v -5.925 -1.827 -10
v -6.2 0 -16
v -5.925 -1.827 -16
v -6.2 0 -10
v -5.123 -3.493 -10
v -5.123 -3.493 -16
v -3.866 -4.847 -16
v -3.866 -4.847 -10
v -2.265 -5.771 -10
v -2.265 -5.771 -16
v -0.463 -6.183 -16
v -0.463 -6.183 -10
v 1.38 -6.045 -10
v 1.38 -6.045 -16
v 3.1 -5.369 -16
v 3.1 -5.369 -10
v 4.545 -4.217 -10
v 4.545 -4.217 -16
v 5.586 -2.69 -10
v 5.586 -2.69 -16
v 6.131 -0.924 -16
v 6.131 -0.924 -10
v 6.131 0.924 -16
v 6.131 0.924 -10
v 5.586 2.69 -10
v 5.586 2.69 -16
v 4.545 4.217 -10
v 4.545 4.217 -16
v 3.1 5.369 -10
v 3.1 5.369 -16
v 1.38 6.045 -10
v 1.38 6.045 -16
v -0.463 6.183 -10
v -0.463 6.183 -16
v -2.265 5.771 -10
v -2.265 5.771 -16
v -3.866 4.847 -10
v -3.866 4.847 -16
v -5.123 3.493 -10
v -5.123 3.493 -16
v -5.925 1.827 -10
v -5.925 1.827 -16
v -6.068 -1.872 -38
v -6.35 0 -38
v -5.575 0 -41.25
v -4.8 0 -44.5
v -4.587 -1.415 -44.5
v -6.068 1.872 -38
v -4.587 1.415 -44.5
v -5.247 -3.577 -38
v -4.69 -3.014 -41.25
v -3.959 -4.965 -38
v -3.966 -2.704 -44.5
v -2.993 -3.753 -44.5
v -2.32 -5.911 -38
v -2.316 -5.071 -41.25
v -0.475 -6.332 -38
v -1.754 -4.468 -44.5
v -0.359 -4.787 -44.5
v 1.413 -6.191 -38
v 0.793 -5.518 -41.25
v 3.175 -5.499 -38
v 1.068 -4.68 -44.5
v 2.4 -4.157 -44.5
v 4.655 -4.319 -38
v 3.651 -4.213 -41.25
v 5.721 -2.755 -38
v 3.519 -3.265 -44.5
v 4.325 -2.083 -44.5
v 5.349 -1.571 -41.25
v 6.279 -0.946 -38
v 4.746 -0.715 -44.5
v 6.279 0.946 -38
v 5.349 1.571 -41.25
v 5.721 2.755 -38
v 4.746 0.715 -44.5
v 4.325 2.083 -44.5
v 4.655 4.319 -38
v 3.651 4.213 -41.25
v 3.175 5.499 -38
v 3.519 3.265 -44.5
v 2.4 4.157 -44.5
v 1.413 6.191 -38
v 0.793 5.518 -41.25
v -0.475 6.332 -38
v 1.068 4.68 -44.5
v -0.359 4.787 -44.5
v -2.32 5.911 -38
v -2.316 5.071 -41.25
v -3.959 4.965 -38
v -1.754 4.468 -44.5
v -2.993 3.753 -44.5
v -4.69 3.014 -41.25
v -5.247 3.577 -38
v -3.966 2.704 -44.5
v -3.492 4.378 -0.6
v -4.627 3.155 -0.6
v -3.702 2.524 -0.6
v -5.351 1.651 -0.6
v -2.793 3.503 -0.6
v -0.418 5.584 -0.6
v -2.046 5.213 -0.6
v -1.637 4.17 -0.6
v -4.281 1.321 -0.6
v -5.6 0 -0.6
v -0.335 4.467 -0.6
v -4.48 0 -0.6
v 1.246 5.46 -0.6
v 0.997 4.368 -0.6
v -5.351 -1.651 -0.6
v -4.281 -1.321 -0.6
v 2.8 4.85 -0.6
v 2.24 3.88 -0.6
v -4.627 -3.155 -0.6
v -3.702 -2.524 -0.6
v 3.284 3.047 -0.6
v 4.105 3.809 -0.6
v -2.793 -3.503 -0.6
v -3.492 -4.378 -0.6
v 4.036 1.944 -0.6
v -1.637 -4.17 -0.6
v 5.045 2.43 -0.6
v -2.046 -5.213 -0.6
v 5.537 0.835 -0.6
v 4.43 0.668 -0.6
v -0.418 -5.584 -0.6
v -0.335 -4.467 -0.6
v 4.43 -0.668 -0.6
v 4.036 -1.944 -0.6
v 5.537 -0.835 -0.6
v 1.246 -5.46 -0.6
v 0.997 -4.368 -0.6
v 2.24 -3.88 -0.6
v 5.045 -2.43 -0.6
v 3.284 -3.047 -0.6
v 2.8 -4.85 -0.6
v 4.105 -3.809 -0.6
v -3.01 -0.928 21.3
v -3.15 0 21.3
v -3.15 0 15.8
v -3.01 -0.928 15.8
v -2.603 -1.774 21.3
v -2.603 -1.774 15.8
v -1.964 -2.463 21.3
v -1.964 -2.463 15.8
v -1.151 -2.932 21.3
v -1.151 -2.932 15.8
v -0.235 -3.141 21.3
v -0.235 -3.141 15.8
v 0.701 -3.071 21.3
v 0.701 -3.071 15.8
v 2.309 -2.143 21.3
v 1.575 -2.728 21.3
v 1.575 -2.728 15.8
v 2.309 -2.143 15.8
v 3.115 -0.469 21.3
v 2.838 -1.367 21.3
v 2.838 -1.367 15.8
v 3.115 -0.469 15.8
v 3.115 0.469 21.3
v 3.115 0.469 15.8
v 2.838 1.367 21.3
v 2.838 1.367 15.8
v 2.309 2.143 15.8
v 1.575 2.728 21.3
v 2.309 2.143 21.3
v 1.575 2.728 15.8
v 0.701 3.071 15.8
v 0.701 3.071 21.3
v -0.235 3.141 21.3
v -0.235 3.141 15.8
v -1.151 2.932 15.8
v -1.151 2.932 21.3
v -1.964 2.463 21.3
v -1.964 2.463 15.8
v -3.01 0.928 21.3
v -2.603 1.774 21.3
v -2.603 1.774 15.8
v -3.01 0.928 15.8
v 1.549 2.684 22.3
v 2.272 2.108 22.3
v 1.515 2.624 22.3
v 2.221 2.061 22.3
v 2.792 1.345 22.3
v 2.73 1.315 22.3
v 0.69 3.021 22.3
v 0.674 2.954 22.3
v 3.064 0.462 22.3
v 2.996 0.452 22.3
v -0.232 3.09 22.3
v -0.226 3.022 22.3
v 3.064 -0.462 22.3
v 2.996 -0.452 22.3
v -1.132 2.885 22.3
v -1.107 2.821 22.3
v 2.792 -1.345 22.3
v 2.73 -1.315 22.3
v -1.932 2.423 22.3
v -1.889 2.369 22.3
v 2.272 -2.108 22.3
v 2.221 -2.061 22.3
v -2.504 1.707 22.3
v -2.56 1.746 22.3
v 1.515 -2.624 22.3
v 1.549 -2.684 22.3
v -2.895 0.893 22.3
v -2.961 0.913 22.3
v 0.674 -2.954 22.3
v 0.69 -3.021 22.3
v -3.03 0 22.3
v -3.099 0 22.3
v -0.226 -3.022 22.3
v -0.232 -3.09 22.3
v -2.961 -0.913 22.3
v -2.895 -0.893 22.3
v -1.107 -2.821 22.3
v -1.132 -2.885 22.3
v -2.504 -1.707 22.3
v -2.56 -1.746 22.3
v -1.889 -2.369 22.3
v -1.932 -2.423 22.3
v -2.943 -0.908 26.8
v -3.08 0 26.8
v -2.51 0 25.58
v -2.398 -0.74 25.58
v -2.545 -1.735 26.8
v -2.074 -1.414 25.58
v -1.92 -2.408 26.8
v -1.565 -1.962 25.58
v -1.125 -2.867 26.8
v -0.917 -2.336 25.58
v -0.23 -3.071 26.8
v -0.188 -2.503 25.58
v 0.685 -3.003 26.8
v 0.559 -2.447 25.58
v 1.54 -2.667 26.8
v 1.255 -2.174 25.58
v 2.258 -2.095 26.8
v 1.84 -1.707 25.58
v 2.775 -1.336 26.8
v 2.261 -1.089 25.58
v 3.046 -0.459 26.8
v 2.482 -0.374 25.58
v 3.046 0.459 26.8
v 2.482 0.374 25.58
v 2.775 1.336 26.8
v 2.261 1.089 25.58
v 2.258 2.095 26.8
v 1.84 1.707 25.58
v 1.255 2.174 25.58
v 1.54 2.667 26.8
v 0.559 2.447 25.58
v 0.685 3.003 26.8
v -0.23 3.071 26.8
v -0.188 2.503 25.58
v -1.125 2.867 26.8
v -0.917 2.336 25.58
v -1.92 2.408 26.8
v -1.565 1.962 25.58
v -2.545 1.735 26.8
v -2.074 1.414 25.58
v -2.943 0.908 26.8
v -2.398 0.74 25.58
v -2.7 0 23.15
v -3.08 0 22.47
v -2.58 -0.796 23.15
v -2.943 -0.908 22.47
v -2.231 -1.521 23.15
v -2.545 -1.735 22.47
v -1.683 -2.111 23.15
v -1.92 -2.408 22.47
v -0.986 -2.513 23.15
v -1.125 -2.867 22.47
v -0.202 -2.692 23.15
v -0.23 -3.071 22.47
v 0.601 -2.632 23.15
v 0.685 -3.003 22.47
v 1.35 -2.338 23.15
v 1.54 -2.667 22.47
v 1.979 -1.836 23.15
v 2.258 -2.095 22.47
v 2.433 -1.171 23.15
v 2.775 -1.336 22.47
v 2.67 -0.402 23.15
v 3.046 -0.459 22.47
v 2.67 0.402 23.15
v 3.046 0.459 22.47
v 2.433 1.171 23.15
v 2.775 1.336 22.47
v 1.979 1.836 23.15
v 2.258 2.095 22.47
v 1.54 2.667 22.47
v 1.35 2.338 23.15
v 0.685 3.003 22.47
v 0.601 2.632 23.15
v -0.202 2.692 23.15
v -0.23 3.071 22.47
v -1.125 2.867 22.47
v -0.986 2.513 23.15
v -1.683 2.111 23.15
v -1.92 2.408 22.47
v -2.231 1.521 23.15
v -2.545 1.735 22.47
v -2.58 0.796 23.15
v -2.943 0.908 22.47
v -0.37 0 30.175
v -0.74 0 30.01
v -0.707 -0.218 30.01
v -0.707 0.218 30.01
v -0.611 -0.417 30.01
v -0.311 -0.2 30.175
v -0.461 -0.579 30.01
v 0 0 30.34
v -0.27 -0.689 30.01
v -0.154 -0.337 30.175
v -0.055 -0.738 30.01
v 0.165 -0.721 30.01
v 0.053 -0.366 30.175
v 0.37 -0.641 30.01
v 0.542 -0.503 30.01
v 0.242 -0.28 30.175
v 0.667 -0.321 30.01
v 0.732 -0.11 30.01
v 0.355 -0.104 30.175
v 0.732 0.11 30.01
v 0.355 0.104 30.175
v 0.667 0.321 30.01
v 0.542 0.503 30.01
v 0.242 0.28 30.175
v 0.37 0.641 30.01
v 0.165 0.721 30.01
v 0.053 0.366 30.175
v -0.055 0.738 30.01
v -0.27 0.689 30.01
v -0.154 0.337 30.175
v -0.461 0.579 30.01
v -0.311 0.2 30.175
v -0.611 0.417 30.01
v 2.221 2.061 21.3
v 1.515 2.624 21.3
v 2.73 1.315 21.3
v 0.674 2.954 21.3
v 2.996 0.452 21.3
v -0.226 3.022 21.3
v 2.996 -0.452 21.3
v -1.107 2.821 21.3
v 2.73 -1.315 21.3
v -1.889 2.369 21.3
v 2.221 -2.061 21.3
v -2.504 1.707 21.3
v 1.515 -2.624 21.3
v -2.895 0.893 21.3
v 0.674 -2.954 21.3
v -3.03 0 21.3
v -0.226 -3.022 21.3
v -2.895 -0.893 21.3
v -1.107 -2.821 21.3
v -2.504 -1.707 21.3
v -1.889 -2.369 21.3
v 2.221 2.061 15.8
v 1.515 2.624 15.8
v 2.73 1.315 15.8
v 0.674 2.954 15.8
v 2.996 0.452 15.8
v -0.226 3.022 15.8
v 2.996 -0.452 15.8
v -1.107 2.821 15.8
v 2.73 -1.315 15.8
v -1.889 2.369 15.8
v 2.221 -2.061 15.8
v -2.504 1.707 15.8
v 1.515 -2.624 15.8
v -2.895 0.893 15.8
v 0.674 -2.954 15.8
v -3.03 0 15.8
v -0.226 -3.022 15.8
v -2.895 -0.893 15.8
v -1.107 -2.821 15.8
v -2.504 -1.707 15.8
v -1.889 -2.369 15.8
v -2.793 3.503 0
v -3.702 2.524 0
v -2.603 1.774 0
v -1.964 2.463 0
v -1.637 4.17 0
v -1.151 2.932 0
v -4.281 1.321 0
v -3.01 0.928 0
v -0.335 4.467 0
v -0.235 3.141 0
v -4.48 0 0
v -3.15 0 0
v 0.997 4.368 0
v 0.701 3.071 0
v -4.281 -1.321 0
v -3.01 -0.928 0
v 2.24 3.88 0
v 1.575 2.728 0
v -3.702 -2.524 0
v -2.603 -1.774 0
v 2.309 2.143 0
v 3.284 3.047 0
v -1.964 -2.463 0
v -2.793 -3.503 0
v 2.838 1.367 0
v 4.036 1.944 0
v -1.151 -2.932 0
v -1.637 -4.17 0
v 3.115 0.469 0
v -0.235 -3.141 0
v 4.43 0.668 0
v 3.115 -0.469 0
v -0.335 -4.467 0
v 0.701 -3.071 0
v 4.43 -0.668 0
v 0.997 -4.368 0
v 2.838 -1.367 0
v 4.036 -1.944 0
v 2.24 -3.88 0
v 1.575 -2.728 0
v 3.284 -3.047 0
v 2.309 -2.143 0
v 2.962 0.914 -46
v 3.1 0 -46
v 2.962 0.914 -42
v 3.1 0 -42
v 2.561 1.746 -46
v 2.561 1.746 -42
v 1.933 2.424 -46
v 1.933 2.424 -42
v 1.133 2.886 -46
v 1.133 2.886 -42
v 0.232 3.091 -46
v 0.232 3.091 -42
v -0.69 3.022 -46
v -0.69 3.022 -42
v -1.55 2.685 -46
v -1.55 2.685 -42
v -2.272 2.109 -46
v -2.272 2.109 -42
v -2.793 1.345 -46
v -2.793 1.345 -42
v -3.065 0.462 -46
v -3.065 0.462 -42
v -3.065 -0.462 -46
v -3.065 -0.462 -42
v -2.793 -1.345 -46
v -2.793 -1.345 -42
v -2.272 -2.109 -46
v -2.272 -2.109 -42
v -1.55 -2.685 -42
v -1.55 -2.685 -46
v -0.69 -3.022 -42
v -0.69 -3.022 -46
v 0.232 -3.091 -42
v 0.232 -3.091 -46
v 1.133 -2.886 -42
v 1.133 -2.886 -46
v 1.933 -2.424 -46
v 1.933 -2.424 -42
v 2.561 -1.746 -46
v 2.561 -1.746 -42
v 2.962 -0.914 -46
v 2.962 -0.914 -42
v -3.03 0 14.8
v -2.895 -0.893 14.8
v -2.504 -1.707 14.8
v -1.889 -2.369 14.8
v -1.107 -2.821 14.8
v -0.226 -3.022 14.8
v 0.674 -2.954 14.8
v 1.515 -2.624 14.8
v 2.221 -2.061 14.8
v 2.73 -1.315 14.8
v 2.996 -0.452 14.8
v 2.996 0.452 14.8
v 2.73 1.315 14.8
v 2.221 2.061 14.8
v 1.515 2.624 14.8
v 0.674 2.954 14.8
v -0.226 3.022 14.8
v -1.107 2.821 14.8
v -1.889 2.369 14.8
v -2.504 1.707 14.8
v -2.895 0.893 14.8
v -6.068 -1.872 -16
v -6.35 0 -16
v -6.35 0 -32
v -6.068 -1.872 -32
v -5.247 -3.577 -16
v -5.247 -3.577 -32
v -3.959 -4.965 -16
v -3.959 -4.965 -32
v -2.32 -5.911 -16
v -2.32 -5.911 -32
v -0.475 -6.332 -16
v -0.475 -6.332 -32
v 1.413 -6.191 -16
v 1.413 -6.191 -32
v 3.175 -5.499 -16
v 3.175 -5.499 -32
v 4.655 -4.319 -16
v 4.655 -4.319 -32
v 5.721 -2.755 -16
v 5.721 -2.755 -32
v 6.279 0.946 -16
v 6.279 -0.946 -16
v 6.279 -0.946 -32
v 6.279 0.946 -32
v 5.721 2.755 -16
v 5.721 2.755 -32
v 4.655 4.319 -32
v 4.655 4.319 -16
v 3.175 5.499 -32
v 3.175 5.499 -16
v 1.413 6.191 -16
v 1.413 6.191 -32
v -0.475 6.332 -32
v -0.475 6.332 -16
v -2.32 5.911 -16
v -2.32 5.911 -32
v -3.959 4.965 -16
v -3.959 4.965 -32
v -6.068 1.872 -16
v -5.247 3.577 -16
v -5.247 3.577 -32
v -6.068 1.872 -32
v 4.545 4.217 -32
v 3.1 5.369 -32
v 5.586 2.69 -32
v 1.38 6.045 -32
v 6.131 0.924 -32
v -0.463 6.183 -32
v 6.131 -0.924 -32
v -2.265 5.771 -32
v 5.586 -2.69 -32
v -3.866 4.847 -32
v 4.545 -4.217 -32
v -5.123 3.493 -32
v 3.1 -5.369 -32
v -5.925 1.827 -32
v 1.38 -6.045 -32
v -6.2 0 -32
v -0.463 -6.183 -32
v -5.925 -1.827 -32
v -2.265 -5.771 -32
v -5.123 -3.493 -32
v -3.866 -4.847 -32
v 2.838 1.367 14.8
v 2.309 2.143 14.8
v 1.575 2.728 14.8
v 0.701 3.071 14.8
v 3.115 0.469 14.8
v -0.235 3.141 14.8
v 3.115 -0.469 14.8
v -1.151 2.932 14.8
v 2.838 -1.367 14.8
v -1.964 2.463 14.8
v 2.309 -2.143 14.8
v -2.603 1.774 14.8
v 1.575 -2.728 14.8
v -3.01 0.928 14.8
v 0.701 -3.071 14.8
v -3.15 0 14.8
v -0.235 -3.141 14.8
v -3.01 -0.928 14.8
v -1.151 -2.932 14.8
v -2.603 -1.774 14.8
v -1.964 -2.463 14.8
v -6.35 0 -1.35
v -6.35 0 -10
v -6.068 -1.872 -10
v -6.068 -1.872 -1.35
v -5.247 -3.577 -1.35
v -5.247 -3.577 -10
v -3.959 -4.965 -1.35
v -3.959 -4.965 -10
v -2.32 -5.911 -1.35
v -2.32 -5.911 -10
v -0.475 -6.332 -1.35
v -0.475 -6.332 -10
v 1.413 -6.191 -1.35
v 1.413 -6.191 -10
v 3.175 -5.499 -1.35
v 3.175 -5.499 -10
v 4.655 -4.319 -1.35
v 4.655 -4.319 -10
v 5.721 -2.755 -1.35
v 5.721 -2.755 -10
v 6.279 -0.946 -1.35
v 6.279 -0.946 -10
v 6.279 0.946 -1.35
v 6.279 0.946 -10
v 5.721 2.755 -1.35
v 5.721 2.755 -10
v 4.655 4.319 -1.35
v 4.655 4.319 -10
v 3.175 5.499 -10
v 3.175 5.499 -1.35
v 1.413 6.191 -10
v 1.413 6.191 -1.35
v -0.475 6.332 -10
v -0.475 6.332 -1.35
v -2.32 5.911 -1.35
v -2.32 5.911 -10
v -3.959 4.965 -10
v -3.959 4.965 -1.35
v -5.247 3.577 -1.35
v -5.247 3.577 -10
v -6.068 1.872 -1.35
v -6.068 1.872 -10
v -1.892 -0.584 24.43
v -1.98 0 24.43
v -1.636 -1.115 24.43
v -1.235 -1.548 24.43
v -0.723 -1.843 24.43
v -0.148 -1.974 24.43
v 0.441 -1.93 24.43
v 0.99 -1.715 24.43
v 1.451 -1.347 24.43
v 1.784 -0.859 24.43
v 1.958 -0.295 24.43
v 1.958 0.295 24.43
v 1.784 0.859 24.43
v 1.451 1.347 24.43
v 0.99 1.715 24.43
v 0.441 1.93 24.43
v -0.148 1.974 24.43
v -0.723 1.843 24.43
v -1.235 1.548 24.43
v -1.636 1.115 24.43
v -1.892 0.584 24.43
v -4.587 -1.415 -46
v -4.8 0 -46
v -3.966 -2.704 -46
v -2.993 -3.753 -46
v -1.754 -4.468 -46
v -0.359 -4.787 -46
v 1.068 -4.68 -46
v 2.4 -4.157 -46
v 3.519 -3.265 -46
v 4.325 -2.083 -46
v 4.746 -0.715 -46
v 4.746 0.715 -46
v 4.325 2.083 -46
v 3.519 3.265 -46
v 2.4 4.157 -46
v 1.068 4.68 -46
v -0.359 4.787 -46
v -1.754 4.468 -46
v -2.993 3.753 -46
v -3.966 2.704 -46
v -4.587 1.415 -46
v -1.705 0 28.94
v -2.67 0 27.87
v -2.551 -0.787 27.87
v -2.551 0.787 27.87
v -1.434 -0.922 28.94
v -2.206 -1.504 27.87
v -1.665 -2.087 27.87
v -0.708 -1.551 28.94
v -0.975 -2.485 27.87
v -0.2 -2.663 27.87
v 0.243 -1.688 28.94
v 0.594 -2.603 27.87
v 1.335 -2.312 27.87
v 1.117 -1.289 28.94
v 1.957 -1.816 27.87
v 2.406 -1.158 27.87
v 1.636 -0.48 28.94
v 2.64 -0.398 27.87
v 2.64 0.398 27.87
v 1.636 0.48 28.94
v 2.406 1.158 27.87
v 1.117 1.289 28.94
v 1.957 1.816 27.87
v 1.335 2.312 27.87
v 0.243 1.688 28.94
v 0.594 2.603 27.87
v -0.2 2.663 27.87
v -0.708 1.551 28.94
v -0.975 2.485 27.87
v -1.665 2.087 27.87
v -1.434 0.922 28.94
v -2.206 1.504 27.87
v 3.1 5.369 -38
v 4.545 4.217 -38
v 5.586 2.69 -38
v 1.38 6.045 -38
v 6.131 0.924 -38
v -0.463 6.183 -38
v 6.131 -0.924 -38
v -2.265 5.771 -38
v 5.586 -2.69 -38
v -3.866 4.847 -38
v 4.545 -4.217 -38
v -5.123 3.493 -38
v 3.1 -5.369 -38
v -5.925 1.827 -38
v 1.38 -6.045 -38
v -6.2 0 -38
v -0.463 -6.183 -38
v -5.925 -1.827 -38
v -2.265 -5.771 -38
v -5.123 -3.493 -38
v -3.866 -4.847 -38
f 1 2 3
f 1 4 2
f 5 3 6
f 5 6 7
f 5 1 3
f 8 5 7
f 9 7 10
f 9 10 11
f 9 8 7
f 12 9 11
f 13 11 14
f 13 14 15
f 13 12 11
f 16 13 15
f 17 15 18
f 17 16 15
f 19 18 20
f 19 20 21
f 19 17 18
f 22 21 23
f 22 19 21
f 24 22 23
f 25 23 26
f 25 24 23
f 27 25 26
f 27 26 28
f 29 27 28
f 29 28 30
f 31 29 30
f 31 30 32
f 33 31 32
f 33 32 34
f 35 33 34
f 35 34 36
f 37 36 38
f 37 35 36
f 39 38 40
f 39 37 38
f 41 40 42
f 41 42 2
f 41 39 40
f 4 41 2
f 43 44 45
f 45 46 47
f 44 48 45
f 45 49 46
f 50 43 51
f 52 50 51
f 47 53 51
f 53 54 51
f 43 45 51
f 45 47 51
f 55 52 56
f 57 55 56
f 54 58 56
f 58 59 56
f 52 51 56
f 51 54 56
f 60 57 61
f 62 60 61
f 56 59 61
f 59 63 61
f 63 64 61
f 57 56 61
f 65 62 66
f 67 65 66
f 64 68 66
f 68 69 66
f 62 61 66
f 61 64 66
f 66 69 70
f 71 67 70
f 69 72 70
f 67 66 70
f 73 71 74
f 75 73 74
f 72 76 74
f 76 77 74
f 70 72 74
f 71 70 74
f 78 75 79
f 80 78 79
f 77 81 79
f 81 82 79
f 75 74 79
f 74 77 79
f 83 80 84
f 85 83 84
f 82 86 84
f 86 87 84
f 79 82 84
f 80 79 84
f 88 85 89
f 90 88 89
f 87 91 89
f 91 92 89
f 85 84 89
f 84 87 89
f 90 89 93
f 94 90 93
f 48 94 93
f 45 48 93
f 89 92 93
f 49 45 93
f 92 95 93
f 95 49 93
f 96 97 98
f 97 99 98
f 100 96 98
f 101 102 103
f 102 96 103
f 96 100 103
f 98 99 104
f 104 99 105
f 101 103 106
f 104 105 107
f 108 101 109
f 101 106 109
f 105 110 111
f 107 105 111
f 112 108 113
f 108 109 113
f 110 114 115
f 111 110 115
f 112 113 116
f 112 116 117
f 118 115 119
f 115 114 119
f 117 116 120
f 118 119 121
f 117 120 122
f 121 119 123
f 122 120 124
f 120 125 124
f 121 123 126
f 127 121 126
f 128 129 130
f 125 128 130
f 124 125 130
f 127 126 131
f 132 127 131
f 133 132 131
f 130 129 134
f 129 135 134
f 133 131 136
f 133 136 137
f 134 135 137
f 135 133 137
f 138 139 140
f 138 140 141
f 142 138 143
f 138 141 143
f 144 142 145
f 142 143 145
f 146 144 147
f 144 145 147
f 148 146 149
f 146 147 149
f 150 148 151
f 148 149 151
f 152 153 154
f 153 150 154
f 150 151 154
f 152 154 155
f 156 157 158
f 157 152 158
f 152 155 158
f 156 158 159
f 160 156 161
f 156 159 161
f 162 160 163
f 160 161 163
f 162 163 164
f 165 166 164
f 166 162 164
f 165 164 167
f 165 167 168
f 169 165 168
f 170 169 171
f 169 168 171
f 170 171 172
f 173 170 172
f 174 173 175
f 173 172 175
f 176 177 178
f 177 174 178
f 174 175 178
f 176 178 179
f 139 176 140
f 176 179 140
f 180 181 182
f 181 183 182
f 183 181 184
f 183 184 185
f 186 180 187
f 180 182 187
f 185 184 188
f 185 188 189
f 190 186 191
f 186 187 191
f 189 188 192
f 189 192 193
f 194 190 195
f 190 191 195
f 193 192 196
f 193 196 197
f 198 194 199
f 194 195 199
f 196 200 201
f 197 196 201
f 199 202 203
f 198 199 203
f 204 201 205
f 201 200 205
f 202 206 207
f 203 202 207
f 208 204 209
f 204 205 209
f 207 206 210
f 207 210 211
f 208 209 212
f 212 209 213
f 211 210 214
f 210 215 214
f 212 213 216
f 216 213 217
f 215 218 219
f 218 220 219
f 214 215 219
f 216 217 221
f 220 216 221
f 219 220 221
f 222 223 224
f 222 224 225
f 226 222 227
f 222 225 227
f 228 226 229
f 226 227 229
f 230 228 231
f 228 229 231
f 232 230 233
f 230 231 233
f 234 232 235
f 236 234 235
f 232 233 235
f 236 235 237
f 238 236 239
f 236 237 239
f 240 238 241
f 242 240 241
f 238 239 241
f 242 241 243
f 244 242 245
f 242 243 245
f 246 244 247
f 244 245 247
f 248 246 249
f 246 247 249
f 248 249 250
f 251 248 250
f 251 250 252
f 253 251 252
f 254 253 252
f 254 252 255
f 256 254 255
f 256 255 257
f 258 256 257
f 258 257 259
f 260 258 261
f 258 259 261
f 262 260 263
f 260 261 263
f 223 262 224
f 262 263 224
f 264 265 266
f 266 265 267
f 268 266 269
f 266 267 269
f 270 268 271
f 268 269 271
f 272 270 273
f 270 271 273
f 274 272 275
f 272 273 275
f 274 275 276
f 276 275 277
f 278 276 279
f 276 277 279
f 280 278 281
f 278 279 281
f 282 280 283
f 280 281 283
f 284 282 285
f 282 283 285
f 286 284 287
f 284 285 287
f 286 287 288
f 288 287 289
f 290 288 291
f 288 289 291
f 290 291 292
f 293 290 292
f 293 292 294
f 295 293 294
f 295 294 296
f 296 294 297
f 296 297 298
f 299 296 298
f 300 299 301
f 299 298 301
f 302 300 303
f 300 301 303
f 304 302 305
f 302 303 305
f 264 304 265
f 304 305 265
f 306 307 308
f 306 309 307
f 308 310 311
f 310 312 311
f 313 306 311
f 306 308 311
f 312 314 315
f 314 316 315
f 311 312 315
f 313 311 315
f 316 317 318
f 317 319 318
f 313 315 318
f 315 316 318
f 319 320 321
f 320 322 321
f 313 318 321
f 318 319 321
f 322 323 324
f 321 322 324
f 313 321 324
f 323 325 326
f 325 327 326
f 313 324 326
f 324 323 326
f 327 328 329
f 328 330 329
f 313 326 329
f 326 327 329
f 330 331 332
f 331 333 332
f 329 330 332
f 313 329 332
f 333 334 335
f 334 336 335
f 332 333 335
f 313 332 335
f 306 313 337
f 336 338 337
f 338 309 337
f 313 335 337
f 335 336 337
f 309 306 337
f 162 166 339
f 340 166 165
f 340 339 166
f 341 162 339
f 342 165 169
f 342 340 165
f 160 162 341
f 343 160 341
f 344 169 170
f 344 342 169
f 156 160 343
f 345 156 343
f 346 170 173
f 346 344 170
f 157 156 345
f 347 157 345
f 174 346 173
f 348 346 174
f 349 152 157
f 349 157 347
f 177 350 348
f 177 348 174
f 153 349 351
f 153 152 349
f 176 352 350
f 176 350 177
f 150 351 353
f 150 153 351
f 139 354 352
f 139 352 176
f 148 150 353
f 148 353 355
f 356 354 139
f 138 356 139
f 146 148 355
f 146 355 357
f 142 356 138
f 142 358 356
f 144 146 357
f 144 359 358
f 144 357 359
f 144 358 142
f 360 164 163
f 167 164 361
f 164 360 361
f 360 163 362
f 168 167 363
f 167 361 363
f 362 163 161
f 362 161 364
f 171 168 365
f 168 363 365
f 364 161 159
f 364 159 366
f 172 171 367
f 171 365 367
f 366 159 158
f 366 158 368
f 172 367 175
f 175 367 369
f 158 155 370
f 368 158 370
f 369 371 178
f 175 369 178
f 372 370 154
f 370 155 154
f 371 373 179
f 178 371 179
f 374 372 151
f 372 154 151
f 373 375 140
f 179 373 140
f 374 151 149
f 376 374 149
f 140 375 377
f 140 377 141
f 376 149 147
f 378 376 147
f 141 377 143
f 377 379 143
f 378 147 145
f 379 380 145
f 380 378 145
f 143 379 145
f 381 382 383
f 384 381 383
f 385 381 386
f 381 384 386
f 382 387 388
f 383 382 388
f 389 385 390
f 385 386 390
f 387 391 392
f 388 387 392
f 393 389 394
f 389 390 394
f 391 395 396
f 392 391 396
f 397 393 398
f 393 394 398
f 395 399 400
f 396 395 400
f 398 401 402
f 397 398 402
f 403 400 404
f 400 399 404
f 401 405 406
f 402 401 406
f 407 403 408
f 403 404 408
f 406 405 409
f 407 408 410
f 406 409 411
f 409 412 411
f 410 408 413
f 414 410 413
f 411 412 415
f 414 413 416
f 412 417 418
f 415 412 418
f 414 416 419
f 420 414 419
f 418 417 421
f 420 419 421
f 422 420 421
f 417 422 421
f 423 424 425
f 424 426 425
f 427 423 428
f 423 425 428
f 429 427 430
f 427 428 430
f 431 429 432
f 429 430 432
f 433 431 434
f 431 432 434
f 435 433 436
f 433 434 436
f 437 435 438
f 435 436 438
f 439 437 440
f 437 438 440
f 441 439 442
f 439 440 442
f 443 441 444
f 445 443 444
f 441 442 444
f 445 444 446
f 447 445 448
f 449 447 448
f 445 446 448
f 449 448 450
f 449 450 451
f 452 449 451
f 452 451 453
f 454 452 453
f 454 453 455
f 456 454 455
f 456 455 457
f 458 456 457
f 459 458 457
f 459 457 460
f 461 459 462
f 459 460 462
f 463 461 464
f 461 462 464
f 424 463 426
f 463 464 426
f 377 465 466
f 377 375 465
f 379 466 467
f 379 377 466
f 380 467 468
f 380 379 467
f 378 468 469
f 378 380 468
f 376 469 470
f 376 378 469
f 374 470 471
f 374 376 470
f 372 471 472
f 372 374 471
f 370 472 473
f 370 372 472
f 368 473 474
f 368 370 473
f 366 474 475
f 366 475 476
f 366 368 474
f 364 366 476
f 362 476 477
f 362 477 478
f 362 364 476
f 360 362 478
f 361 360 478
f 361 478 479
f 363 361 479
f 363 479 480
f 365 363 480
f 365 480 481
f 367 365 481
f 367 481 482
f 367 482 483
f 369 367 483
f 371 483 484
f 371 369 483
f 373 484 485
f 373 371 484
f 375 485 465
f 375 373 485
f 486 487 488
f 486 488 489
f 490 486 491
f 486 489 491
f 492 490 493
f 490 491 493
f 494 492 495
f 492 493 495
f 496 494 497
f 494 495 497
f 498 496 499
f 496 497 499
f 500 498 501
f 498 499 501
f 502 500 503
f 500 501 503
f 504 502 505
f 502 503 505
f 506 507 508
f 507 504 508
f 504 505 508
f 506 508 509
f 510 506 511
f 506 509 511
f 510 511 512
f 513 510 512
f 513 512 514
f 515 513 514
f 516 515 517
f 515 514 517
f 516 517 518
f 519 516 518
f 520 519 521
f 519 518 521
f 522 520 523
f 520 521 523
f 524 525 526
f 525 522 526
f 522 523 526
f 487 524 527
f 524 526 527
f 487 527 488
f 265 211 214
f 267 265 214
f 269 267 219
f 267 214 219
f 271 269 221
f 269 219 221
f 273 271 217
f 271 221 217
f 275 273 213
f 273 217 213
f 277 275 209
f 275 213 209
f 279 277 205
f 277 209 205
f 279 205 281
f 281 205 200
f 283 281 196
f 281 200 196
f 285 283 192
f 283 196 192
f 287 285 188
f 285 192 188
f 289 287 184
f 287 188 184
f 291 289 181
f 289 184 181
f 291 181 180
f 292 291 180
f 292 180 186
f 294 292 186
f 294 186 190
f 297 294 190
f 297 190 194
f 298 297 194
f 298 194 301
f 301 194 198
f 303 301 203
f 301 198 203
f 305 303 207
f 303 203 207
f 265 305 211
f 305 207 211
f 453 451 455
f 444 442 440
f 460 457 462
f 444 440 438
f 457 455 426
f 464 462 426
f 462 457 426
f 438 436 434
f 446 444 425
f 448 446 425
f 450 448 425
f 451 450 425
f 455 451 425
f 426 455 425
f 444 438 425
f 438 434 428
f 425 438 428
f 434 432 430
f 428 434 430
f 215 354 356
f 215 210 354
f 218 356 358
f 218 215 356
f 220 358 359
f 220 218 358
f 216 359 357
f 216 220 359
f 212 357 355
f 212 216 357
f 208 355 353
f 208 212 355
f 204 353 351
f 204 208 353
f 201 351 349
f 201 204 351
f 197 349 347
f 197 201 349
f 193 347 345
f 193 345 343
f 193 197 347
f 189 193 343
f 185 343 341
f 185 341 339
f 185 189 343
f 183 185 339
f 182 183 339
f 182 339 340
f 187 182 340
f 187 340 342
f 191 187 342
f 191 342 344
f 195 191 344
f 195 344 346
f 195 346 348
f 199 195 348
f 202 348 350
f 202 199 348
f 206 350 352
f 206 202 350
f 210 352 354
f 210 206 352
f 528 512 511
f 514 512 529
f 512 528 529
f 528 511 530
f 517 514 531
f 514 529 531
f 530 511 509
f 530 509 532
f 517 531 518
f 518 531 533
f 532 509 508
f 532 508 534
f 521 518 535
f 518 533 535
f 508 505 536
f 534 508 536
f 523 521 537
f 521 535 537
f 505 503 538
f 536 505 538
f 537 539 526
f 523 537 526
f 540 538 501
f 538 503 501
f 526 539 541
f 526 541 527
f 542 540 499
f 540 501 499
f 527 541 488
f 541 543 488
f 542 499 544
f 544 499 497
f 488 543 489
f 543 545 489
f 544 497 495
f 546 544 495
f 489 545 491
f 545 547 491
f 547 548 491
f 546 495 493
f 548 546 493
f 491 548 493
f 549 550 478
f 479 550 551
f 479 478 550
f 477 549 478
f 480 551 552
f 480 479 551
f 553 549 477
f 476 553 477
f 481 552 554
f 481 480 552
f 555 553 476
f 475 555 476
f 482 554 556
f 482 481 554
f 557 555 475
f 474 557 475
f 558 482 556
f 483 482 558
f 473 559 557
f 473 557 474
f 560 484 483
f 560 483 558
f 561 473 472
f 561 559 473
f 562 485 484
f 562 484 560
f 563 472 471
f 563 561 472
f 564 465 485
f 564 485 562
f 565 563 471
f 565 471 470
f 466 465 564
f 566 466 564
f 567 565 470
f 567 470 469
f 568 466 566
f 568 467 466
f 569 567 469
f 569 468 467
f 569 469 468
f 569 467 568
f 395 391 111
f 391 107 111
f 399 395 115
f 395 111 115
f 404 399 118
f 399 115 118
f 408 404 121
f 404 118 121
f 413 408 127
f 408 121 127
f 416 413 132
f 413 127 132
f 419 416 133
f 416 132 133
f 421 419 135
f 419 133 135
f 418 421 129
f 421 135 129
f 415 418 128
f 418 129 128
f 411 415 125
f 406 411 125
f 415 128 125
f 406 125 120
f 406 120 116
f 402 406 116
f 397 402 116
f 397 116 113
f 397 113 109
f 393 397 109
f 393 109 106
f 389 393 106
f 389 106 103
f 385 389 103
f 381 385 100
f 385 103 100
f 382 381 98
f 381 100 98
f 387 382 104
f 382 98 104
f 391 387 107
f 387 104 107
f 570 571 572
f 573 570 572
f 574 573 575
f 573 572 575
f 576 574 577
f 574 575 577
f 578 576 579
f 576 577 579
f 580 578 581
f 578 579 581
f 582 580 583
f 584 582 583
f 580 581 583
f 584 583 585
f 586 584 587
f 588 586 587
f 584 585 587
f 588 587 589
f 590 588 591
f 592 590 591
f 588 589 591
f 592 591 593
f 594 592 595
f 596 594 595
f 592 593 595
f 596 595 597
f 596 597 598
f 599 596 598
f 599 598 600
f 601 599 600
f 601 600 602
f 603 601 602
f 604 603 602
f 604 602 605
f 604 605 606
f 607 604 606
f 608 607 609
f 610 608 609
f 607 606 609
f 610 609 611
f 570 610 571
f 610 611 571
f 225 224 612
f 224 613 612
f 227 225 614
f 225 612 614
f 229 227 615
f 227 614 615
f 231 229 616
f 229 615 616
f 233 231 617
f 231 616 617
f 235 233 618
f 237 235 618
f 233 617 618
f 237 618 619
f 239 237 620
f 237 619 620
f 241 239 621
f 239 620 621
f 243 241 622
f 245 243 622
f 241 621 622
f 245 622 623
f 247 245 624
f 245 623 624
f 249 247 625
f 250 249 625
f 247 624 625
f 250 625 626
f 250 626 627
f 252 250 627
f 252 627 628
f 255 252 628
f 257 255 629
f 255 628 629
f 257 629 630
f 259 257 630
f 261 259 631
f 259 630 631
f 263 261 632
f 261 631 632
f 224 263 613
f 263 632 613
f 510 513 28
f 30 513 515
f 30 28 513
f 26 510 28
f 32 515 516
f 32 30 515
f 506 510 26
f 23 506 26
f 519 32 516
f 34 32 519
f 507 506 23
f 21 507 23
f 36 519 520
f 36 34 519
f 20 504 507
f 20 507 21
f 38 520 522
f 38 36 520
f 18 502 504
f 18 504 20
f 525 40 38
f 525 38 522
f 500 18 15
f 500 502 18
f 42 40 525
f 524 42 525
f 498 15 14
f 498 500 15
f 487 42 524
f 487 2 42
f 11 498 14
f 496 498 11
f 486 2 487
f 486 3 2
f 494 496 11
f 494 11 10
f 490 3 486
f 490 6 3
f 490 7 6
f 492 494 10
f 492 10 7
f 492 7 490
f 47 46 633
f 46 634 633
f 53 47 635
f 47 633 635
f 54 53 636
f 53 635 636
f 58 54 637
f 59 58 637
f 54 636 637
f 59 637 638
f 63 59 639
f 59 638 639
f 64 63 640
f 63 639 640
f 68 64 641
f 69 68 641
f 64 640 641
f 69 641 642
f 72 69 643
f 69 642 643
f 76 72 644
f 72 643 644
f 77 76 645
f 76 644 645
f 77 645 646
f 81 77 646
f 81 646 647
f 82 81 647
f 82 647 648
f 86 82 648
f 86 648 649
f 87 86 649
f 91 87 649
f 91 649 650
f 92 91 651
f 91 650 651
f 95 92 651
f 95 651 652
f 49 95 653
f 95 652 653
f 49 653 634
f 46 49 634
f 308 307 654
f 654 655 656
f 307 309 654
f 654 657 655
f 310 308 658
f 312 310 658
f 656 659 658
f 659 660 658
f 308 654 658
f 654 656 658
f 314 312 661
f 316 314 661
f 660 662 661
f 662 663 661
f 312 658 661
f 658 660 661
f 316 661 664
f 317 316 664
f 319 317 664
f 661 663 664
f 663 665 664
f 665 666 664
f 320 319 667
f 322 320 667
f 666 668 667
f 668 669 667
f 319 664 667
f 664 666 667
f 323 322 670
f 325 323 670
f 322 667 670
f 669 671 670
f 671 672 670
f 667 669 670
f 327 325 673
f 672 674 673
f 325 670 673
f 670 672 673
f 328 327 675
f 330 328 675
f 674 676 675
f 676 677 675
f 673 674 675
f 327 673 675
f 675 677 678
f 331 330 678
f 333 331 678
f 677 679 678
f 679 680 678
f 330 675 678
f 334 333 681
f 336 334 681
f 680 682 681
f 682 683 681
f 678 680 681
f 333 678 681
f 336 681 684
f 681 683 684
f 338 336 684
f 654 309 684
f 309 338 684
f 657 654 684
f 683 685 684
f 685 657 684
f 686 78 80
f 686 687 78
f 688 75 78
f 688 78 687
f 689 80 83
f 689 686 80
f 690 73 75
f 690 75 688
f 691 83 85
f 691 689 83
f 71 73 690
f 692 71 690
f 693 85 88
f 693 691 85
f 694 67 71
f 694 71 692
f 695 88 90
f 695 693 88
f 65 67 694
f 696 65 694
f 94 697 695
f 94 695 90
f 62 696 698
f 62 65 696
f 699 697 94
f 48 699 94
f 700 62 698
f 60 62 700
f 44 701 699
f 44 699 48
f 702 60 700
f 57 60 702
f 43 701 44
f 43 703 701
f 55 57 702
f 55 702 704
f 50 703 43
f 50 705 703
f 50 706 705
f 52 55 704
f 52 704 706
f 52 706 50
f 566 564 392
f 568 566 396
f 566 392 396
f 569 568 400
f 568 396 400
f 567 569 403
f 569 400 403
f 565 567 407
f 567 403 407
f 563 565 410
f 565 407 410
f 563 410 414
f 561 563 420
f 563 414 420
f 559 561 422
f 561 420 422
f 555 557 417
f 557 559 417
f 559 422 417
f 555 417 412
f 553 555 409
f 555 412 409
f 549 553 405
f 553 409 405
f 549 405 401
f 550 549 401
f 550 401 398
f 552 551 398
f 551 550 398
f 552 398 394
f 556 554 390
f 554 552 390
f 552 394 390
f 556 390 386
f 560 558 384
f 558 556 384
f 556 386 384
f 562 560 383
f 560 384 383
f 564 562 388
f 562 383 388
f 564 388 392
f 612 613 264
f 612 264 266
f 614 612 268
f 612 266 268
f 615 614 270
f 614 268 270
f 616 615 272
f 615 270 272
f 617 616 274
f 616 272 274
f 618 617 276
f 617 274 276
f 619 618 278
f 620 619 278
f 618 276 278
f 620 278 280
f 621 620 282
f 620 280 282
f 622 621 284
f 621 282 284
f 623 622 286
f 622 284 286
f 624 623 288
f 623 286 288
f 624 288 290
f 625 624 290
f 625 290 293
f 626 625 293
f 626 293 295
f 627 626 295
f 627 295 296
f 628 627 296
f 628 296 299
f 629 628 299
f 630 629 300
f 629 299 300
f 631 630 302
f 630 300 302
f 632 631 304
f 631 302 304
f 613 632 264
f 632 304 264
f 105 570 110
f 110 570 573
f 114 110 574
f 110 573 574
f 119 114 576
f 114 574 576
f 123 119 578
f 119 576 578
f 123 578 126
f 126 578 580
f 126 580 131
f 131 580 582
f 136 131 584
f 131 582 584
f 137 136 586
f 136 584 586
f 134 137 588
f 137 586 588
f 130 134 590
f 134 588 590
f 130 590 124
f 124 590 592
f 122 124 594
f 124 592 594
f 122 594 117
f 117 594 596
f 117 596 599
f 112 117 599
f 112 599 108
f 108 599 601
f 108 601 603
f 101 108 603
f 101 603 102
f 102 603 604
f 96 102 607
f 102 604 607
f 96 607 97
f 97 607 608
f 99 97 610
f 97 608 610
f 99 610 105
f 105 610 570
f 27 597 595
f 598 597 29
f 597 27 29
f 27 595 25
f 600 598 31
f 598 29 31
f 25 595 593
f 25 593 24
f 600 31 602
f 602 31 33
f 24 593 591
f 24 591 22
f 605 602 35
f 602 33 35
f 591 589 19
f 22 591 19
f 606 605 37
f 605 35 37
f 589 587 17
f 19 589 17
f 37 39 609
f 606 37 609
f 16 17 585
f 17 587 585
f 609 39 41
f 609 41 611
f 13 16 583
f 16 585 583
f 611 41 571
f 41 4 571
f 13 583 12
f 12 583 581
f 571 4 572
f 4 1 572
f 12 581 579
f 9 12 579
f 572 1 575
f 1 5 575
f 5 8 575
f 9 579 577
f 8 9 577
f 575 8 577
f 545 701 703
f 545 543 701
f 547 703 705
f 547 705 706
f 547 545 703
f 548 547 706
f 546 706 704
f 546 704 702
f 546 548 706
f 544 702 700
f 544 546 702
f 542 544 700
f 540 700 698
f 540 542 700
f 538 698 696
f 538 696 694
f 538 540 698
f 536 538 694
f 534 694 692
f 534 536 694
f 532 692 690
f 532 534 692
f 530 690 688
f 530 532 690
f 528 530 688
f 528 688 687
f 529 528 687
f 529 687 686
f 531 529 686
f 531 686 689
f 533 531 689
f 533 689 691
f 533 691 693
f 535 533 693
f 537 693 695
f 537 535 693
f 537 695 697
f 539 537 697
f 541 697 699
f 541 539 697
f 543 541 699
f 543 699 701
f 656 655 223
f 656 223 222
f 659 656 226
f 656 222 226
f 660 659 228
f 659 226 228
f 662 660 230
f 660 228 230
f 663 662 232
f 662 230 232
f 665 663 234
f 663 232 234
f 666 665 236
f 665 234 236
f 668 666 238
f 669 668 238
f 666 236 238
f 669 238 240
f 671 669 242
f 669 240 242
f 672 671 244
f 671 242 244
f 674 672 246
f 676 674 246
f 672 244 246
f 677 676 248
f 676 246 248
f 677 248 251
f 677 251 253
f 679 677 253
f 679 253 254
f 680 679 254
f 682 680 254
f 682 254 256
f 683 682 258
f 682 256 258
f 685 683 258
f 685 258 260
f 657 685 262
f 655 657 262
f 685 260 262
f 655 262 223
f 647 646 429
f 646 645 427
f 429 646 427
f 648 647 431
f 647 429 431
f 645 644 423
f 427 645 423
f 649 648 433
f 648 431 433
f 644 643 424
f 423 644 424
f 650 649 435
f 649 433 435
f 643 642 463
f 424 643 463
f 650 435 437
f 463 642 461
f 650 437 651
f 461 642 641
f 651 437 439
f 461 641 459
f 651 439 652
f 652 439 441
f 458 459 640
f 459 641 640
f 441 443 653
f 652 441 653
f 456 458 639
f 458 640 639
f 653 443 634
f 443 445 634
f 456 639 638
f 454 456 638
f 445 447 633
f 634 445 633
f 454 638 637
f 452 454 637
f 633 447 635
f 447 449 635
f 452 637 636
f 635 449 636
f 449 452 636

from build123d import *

# Parameters (mm, degrees)
SKETCH2_W = 0.37
SKETCH2_H = 1
SKETCH3_W = 0.4
SKETCH3_H = 6
SKETCH4_W = 3.1
SKETCH4_H = 4.5


with BuildPart() as part:
    # Sketch1 → Body (revolve)
    with BuildSketch(Plane(origin=(0, 0, 0), x_dir=(-1, 0, 0), z_dir=(0, 1, 0)), mode=Mode.PRIVATE) as body_sk:
        Polygon((0, 30.34), (-0.74, 30.01), (-2.67, 27.87), (-3.08, 26.8), (-2.51, 25.58), (-1.98, 24.43), (-2.7, 23.15), (-3.08, 22.47), (-3.15, 21.84), (-3.15, 0), (-4.48, 0), (-4.48, -0.6), (-5.6, -0.6), (-6.35, -1.35), (-6.35, -38), (-4.8, -44.5), (-4.8, -46), (0, -46), align=None)
    revolve(body_sk.sketch.rotate(Axis((0, 0, -200), (0, 0, 1)), 180), axis=Axis((0, 0, -200), (0, 0, 1)))

    # Sketch2 → Insulators (revolve, cut)
    with BuildSketch(Plane(origin=(0, 0, 0), x_dir=(-1, 0, 0), z_dir=(0, 1, 0)), mode=Mode.PRIVATE) as insulators_sk:
        with Locations((-3.215, 21.8)):
            Rectangle(SKETCH2_W, SKETCH2_H)
        with Locations((-3.215, 15.3)):
            Rectangle(SKETCH2_W, SKETCH2_H)
    revolve(insulators_sk.sketch.rotate(Axis((0, 0, -200), (0, 0, 1)), 180), axis=Axis((0, 0, -200), (0, 0, 1)), mode=Mode.SUBTRACT)

    # Sketch3 → Grip (revolve, cut)
    with BuildSketch(Plane(origin=(0, 0, 0), x_dir=(-1, 0, 0), z_dir=(0, 1, 0)), mode=Mode.PRIVATE) as grip_sk:
        with Locations((-6.4, -13)):
            Rectangle(SKETCH3_W, SKETCH3_H)
        with Locations((-6.4, -35)):
            Rectangle(SKETCH3_W, SKETCH3_H)
    revolve(grip_sk.sketch.rotate(Axis((0, 0, -200), (0, 0, 1)), 180), axis=Axis((0, 0, -200), (0, 0, 1)), mode=Mode.SUBTRACT)

    # Sketch4 → CableBore (revolve, cut)
    with BuildSketch(Plane(origin=(0, 0, 0), x_dir=(-1, 0, 0), z_dir=(0, 1, 0))):
        with Locations((-1.55, -44.25)):
            Rectangle(SKETCH4_W, SKETCH4_H)
    revolve(axis=Axis((0, 0, -200), (0, 0, 1)), mode=Mode.SUBTRACT)


solid = part.part
